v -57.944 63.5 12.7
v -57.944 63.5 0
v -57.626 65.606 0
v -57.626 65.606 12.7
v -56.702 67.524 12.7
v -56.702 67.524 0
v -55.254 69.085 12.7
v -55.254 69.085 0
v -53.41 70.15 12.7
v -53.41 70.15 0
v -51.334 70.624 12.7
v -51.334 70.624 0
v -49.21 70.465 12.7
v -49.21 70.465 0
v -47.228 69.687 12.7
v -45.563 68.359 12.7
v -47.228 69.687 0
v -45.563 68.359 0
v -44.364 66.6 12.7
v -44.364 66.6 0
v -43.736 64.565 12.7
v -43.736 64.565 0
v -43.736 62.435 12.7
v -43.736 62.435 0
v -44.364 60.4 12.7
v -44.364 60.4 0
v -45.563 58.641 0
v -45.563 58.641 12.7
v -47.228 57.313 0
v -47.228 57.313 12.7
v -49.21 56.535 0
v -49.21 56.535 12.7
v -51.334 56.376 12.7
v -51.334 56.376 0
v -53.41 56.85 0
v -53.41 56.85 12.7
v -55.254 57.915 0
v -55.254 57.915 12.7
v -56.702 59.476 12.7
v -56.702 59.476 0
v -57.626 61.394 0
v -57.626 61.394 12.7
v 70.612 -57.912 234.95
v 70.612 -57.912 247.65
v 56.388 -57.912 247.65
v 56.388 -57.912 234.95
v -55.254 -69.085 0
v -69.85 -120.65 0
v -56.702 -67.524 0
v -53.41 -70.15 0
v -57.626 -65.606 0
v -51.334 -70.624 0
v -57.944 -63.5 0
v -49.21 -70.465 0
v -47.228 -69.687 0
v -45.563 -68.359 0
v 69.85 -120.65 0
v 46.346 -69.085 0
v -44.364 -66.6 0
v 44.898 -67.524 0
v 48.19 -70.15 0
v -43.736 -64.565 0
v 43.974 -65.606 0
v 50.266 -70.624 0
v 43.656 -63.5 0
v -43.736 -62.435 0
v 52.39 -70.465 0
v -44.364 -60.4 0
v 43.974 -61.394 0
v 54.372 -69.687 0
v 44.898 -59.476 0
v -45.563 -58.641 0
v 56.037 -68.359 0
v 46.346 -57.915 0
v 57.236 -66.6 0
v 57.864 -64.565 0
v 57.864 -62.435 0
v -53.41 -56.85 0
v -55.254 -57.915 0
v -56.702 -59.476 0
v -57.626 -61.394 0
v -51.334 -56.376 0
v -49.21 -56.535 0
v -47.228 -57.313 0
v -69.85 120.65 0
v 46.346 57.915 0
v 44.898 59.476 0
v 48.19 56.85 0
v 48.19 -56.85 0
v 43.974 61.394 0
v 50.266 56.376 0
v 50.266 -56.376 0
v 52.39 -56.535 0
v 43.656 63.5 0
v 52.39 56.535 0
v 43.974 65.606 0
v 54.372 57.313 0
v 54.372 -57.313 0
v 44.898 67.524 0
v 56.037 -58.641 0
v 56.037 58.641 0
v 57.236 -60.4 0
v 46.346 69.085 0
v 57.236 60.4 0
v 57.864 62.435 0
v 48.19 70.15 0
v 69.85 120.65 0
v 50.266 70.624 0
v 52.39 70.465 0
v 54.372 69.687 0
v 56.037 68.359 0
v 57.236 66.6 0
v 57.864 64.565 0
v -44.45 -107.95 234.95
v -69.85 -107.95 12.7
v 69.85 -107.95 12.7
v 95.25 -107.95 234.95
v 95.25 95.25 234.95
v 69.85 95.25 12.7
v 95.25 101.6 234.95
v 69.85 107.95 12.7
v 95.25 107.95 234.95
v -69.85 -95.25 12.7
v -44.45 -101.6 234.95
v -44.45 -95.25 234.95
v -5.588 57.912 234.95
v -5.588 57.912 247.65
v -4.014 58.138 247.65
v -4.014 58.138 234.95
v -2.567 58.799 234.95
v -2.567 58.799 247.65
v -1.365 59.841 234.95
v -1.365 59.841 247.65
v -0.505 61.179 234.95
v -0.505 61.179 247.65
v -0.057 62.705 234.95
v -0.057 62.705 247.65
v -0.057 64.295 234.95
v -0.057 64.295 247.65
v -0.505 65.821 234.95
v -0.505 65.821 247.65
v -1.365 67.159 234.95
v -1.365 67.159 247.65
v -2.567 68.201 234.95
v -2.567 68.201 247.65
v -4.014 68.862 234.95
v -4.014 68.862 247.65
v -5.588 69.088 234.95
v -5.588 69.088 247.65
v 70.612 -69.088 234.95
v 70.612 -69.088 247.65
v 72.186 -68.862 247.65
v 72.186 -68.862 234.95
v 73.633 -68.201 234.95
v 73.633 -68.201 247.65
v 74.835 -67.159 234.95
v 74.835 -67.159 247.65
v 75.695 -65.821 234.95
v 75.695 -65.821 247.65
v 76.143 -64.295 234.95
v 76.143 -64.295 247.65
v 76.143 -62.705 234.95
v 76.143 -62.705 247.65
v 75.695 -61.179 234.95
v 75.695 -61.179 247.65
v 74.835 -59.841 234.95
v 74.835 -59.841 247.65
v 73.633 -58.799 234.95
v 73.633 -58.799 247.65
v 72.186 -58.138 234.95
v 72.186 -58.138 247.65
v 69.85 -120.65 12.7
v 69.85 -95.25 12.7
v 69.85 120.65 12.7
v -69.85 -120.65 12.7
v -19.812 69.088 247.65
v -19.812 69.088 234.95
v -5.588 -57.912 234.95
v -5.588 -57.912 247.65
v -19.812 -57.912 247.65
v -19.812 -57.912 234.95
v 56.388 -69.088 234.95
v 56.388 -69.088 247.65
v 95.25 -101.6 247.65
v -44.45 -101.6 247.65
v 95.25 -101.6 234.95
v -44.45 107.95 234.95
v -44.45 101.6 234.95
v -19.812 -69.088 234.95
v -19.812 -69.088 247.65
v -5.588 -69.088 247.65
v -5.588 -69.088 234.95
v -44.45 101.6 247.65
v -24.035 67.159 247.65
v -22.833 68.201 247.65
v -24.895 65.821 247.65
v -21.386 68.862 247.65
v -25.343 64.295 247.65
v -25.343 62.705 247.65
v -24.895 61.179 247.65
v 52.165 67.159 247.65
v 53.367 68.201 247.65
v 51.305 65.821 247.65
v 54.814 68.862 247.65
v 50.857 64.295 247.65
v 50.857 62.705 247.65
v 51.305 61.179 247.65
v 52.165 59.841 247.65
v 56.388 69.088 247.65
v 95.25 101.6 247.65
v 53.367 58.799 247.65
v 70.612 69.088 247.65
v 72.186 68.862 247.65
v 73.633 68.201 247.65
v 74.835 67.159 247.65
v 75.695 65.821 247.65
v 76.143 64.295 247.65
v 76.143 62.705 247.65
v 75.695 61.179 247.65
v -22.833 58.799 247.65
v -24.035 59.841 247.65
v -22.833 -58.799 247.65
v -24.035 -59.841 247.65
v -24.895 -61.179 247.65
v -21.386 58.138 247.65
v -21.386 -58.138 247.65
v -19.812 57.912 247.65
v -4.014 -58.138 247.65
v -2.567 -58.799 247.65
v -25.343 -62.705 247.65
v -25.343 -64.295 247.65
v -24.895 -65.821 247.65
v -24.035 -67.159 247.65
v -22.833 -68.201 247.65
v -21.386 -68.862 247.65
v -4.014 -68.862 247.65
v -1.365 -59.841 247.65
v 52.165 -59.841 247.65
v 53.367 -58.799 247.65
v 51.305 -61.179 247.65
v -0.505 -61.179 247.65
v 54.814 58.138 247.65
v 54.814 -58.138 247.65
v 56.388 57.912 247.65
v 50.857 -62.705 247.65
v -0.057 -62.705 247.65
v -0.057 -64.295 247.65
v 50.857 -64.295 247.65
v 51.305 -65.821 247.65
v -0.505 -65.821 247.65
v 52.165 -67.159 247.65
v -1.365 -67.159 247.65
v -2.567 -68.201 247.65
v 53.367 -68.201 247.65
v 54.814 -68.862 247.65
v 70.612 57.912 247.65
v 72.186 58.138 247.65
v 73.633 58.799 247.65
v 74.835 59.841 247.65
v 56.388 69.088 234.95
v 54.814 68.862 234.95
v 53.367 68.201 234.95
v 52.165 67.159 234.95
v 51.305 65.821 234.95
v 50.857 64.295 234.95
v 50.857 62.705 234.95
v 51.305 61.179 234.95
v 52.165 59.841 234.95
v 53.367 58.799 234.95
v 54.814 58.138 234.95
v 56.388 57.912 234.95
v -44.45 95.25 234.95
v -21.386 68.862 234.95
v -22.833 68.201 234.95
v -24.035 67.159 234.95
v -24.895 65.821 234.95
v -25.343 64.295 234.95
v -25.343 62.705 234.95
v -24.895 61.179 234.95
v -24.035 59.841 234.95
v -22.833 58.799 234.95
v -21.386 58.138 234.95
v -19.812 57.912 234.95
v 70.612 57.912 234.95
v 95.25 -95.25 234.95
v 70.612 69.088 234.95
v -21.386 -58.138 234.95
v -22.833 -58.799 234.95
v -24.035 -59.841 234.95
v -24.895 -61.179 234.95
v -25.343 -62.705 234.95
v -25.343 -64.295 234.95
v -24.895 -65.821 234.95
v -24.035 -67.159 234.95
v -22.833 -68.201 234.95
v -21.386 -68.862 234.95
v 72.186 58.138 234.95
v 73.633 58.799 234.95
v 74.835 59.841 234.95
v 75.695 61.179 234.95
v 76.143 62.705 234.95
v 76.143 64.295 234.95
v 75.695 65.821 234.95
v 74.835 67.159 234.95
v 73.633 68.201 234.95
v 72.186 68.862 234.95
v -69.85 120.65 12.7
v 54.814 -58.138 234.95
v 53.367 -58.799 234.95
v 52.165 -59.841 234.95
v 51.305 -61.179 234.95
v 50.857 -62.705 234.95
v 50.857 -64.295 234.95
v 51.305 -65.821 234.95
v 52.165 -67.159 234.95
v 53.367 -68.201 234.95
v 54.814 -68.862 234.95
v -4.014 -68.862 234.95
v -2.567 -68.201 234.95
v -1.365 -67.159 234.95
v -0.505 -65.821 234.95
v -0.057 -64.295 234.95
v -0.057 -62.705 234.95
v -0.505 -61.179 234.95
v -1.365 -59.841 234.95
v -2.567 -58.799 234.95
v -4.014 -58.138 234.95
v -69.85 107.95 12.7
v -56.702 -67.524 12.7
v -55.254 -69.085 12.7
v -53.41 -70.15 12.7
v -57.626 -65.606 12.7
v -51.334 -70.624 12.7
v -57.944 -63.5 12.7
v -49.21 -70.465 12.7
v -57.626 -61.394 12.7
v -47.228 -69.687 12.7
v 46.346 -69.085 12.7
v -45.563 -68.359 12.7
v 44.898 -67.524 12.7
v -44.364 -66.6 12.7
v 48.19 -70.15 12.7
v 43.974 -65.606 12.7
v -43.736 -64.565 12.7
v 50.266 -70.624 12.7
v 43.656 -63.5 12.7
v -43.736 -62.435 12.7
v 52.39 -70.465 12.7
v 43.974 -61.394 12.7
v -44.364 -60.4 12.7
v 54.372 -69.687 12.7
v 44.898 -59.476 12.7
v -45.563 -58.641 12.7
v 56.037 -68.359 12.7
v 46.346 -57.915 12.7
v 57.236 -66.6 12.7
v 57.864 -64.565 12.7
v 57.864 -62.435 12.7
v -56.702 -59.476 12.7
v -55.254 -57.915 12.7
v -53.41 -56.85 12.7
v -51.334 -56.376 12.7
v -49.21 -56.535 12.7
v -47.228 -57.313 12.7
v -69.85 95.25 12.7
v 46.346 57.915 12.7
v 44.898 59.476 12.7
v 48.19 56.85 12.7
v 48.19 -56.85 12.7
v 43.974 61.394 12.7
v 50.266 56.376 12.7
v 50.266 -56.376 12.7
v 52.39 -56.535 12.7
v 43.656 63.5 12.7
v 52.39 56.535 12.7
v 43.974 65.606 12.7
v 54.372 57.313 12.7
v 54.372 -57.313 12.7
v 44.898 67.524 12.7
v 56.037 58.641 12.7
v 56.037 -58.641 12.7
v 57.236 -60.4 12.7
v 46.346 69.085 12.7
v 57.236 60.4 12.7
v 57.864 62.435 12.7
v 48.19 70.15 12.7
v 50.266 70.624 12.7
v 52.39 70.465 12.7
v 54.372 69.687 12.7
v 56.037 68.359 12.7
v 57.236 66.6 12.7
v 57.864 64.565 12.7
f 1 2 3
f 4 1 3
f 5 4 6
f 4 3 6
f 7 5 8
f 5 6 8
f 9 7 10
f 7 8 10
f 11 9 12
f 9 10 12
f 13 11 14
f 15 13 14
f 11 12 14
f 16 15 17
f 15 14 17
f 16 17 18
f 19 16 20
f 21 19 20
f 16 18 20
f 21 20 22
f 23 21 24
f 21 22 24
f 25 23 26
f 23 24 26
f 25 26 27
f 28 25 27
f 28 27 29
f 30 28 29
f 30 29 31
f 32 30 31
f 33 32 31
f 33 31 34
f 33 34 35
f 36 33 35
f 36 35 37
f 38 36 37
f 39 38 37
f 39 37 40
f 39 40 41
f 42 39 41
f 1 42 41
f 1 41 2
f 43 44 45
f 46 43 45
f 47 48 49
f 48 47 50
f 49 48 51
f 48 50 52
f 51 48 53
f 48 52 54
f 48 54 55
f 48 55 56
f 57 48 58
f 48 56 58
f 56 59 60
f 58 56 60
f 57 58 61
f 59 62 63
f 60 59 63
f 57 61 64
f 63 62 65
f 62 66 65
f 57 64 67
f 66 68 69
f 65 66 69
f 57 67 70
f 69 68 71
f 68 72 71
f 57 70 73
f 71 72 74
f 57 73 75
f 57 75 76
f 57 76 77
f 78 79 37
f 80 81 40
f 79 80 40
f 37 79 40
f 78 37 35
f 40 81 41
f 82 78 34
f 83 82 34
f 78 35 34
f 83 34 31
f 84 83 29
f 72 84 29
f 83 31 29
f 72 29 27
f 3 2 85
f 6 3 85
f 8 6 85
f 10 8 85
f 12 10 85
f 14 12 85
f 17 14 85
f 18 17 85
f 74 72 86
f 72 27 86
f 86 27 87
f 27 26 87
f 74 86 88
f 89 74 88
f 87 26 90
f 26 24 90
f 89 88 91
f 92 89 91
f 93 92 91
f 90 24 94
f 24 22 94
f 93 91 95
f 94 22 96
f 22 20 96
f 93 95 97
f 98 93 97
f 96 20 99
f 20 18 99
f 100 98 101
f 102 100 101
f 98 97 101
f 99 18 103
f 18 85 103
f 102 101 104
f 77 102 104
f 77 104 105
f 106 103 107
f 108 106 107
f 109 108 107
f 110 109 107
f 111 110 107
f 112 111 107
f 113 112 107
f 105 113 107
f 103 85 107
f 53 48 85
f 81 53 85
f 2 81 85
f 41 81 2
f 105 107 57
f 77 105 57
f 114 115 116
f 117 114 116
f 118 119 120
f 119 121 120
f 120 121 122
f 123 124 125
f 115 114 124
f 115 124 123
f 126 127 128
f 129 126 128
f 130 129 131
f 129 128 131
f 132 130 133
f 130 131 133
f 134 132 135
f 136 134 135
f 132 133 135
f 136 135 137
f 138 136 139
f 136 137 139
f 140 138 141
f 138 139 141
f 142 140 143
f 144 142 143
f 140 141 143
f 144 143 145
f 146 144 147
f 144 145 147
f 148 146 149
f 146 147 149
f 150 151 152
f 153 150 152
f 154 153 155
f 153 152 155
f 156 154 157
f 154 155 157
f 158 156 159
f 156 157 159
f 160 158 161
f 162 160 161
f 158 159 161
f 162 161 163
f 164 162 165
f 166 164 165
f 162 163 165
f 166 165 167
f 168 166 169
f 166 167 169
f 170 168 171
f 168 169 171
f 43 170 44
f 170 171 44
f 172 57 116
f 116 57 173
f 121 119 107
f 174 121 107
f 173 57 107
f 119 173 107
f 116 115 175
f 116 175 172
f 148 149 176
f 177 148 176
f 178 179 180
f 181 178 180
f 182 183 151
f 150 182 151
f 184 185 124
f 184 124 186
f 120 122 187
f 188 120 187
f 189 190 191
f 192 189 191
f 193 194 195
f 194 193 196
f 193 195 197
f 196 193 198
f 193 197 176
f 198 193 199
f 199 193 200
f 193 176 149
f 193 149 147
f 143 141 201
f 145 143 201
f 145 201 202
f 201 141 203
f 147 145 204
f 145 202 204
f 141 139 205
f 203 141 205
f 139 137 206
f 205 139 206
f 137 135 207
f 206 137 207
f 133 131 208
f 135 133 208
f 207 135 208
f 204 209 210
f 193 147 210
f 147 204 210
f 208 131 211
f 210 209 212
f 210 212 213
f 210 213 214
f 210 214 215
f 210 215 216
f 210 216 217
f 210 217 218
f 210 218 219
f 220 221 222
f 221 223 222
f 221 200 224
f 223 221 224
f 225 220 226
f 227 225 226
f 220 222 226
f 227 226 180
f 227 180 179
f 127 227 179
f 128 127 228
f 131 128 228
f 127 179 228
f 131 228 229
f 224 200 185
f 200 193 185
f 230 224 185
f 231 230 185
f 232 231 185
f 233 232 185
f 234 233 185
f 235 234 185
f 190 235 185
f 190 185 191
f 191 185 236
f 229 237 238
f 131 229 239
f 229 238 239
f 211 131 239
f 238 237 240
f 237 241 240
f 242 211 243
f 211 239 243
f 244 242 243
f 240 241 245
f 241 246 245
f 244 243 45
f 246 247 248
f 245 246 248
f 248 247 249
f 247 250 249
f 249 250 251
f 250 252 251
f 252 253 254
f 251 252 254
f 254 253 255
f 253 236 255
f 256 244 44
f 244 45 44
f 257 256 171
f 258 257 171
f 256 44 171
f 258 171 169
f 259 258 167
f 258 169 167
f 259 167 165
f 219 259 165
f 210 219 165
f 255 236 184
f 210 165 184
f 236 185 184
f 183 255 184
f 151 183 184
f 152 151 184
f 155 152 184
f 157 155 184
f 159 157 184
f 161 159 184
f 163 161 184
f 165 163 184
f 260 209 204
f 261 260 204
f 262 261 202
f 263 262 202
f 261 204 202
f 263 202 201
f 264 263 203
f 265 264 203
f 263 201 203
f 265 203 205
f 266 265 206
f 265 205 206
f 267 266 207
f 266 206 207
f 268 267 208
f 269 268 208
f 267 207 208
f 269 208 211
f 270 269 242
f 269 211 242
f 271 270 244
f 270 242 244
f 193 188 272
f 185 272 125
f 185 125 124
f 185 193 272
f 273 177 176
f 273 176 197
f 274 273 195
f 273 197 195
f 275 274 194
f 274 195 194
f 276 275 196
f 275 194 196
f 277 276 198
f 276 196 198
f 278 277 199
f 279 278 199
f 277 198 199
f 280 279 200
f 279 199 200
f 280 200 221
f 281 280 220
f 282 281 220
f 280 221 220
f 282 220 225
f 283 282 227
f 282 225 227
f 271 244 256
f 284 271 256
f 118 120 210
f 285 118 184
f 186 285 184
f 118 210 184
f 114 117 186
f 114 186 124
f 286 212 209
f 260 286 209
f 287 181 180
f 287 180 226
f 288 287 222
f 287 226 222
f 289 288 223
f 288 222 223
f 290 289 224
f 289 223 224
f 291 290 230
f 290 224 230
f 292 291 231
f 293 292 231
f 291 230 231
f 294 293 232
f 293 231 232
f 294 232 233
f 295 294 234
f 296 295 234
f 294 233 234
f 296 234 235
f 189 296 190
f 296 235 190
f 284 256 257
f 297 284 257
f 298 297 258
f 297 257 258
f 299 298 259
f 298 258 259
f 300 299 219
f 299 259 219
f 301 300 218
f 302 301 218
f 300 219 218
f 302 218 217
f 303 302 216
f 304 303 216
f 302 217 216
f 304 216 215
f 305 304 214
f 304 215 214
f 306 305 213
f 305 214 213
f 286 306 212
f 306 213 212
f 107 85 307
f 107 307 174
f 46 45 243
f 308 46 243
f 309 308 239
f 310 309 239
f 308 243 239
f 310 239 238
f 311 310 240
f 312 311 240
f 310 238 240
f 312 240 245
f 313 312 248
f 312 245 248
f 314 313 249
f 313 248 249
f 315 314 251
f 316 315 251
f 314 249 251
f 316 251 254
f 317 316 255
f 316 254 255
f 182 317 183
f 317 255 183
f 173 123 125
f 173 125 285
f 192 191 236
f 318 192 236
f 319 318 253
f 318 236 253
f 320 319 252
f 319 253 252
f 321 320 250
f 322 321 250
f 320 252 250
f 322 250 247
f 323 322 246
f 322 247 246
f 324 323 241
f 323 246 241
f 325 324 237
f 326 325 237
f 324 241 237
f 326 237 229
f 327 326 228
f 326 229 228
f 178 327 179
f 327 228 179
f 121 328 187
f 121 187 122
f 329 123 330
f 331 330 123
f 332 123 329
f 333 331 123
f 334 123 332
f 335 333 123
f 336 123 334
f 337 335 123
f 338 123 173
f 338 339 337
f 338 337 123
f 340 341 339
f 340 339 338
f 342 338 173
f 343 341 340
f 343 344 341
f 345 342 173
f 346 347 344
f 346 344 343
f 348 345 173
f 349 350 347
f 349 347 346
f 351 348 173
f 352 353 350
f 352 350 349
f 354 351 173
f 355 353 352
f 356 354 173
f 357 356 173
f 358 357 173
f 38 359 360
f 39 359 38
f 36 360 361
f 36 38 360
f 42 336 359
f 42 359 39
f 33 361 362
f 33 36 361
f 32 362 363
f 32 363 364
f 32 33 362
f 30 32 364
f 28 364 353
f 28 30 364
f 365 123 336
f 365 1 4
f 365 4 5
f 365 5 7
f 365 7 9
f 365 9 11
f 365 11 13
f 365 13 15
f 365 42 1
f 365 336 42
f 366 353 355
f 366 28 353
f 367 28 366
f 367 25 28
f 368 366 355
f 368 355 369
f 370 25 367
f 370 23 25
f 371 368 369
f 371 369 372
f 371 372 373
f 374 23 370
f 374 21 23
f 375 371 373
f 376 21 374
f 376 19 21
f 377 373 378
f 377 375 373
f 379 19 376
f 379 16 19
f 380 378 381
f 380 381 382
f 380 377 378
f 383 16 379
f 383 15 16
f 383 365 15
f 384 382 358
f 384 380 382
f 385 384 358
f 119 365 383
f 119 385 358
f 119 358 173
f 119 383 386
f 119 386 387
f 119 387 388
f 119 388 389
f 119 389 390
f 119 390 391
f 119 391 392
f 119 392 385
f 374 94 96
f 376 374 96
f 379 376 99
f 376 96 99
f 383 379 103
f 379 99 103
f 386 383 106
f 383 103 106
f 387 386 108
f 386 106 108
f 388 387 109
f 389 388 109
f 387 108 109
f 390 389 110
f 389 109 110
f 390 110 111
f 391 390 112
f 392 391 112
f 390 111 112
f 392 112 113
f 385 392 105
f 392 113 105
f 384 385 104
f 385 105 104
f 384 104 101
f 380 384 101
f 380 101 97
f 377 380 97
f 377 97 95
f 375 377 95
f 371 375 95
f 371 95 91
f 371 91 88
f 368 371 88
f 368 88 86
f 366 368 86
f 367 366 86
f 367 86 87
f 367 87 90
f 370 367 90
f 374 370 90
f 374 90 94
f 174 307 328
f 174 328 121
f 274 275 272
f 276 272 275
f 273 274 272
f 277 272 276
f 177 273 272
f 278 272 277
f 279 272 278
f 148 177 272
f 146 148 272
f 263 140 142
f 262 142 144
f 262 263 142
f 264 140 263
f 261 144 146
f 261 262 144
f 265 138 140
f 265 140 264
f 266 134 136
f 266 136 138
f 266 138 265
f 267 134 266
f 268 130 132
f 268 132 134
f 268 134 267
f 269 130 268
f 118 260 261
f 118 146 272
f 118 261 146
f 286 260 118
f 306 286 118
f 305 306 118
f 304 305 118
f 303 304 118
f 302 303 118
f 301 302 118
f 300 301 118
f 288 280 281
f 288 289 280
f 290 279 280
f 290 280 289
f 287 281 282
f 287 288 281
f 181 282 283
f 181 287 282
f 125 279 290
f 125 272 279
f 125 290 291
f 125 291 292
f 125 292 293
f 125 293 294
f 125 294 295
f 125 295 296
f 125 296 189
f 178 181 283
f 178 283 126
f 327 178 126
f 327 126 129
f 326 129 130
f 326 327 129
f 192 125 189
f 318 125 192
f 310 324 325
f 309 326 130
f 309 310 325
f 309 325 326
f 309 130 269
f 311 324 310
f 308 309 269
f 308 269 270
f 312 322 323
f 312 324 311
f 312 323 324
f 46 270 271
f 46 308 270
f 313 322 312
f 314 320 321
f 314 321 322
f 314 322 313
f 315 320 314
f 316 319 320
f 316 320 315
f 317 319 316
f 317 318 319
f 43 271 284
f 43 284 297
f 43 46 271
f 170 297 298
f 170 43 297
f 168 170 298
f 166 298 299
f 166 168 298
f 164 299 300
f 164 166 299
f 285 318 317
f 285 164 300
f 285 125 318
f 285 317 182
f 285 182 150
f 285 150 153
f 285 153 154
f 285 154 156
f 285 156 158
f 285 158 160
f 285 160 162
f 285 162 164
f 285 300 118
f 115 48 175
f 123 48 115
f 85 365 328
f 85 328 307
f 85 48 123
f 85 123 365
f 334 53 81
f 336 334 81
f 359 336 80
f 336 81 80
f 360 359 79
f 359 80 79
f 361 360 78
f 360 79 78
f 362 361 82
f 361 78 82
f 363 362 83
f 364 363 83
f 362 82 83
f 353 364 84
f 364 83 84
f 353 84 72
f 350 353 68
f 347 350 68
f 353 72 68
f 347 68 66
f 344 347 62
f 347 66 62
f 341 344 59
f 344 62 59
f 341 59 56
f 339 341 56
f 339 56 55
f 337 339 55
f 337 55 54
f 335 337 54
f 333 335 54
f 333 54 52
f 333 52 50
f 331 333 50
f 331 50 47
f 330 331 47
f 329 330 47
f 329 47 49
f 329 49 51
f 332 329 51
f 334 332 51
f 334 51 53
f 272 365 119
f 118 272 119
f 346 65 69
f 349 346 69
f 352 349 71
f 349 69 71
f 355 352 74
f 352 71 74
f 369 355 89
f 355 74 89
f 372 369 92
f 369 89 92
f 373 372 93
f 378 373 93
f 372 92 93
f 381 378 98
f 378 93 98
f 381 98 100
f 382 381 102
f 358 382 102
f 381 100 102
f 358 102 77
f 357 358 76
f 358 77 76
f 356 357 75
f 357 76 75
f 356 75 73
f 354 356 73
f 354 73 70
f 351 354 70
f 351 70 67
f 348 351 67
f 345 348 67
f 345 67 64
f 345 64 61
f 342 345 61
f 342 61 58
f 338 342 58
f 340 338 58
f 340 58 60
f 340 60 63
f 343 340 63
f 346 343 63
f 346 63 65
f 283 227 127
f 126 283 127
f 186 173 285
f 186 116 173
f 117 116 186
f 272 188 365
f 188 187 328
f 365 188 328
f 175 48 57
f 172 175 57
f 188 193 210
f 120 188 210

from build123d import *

# Parameters (mm, degrees)
F0_W     = 139.7
F0_H     = 241.3
F1_DEPTH = 12.7
F3_D     = 14.2875
F5_W     = 139.7
F5_H     = 203.2
F6_DEPTH = 12.7
F8_DEPTH = 6.35


with BuildPart() as f1:
    # F0 (on Top) → F1 (new body)
    with BuildSketch(Plane.XY):
        Rectangle(F0_W, F0_H)
    extrude(amount=F1_DEPTH)

    # F3 (through all)
    with Locations(Plane.XY.offset(12.7)):
        with Locations((-50.8, 63.5), (50.8, 63.5), (50.8, -63.5), (-50.8, -63.5)):
            Hole(F3_D / 2)



with BuildPart() as f6:
    # F5 (on offset) → F6 (new body)
    with BuildSketch(Plane(origin=(0, 0, 247.65), x_dir=(1, 0, 0), z_dir=(0, 0, -1))):
        with Locations((25.4, 0)):
            Rectangle(F5_W, F5_H)
        with BuildLine():
            Line((-5.588, -69.088), (-19.812, -69.088))
            ThreePointArc((-19.812, -69.088), (-25.4, -63.5), (-19.812, -57.912))
            Line((-19.812, -57.912), (-5.588, -57.912))
            ThreePointArc((-5.588, -57.912), (0, -63.5), (-5.588, -69.088))
        make_face(mode=Mode.SUBTRACT)
        with BuildLine():
            ThreePointArc((56.388, -69.088), (50.8, -63.5), (56.388, -57.912))
            Line((56.388, -57.912), (70.612, -57.912))
            ThreePointArc((70.612, -57.912), (76.2, -63.5), (70.612, -69.088))
            Line((70.612, -69.088), (56.388, -69.088))
        make_face(mode=Mode.SUBTRACT)
        with BuildLine():
            Line((-5.588, 57.912), (-19.812, 57.912))
            ThreePointArc((-19.812, 57.912), (-25.4, 63.5), (-19.812, 69.088))
            Line((-19.812, 69.088), (-5.588, 69.088))
            ThreePointArc((-5.588, 69.088), (0, 63.5), (-5.588, 57.912))
        make_face(mode=Mode.SUBTRACT)
        with BuildLine():
            Line((56.388, 69.088), (70.612, 69.088))
            ThreePointArc((70.612, 69.088), (76.2, 63.5), (70.612, 57.912))
            Line((70.612, 57.912), (56.388, 57.912))
            ThreePointArc((56.388, 57.912), (50.8, 63.5), (56.388, 69.088))
        make_face(mode=Mode.SUBTRACT)
    extrude(amount=F6_DEPTH)


with BuildPart() as f1_1:
    add(f1.part)

    add(f6.part)  # F8 merges F6
    # F7 (on face) → F8 (join, symmetric)
    with BuildSketch(Plane.XZ.offset(101.6)):
        Polygon((95.25, 234.95), (-44.45, 234.95), (-69.85, 12.7), (69.85, 12.7), align=None)
    extrude(amount=F8_DEPTH, both=True)

    # F9: F1 across plane


with BuildPart() as f1_2:
    add(f1_1.part)
    add(f1_1.part.mirror(Plane.XZ))


solid = f1_2.part
